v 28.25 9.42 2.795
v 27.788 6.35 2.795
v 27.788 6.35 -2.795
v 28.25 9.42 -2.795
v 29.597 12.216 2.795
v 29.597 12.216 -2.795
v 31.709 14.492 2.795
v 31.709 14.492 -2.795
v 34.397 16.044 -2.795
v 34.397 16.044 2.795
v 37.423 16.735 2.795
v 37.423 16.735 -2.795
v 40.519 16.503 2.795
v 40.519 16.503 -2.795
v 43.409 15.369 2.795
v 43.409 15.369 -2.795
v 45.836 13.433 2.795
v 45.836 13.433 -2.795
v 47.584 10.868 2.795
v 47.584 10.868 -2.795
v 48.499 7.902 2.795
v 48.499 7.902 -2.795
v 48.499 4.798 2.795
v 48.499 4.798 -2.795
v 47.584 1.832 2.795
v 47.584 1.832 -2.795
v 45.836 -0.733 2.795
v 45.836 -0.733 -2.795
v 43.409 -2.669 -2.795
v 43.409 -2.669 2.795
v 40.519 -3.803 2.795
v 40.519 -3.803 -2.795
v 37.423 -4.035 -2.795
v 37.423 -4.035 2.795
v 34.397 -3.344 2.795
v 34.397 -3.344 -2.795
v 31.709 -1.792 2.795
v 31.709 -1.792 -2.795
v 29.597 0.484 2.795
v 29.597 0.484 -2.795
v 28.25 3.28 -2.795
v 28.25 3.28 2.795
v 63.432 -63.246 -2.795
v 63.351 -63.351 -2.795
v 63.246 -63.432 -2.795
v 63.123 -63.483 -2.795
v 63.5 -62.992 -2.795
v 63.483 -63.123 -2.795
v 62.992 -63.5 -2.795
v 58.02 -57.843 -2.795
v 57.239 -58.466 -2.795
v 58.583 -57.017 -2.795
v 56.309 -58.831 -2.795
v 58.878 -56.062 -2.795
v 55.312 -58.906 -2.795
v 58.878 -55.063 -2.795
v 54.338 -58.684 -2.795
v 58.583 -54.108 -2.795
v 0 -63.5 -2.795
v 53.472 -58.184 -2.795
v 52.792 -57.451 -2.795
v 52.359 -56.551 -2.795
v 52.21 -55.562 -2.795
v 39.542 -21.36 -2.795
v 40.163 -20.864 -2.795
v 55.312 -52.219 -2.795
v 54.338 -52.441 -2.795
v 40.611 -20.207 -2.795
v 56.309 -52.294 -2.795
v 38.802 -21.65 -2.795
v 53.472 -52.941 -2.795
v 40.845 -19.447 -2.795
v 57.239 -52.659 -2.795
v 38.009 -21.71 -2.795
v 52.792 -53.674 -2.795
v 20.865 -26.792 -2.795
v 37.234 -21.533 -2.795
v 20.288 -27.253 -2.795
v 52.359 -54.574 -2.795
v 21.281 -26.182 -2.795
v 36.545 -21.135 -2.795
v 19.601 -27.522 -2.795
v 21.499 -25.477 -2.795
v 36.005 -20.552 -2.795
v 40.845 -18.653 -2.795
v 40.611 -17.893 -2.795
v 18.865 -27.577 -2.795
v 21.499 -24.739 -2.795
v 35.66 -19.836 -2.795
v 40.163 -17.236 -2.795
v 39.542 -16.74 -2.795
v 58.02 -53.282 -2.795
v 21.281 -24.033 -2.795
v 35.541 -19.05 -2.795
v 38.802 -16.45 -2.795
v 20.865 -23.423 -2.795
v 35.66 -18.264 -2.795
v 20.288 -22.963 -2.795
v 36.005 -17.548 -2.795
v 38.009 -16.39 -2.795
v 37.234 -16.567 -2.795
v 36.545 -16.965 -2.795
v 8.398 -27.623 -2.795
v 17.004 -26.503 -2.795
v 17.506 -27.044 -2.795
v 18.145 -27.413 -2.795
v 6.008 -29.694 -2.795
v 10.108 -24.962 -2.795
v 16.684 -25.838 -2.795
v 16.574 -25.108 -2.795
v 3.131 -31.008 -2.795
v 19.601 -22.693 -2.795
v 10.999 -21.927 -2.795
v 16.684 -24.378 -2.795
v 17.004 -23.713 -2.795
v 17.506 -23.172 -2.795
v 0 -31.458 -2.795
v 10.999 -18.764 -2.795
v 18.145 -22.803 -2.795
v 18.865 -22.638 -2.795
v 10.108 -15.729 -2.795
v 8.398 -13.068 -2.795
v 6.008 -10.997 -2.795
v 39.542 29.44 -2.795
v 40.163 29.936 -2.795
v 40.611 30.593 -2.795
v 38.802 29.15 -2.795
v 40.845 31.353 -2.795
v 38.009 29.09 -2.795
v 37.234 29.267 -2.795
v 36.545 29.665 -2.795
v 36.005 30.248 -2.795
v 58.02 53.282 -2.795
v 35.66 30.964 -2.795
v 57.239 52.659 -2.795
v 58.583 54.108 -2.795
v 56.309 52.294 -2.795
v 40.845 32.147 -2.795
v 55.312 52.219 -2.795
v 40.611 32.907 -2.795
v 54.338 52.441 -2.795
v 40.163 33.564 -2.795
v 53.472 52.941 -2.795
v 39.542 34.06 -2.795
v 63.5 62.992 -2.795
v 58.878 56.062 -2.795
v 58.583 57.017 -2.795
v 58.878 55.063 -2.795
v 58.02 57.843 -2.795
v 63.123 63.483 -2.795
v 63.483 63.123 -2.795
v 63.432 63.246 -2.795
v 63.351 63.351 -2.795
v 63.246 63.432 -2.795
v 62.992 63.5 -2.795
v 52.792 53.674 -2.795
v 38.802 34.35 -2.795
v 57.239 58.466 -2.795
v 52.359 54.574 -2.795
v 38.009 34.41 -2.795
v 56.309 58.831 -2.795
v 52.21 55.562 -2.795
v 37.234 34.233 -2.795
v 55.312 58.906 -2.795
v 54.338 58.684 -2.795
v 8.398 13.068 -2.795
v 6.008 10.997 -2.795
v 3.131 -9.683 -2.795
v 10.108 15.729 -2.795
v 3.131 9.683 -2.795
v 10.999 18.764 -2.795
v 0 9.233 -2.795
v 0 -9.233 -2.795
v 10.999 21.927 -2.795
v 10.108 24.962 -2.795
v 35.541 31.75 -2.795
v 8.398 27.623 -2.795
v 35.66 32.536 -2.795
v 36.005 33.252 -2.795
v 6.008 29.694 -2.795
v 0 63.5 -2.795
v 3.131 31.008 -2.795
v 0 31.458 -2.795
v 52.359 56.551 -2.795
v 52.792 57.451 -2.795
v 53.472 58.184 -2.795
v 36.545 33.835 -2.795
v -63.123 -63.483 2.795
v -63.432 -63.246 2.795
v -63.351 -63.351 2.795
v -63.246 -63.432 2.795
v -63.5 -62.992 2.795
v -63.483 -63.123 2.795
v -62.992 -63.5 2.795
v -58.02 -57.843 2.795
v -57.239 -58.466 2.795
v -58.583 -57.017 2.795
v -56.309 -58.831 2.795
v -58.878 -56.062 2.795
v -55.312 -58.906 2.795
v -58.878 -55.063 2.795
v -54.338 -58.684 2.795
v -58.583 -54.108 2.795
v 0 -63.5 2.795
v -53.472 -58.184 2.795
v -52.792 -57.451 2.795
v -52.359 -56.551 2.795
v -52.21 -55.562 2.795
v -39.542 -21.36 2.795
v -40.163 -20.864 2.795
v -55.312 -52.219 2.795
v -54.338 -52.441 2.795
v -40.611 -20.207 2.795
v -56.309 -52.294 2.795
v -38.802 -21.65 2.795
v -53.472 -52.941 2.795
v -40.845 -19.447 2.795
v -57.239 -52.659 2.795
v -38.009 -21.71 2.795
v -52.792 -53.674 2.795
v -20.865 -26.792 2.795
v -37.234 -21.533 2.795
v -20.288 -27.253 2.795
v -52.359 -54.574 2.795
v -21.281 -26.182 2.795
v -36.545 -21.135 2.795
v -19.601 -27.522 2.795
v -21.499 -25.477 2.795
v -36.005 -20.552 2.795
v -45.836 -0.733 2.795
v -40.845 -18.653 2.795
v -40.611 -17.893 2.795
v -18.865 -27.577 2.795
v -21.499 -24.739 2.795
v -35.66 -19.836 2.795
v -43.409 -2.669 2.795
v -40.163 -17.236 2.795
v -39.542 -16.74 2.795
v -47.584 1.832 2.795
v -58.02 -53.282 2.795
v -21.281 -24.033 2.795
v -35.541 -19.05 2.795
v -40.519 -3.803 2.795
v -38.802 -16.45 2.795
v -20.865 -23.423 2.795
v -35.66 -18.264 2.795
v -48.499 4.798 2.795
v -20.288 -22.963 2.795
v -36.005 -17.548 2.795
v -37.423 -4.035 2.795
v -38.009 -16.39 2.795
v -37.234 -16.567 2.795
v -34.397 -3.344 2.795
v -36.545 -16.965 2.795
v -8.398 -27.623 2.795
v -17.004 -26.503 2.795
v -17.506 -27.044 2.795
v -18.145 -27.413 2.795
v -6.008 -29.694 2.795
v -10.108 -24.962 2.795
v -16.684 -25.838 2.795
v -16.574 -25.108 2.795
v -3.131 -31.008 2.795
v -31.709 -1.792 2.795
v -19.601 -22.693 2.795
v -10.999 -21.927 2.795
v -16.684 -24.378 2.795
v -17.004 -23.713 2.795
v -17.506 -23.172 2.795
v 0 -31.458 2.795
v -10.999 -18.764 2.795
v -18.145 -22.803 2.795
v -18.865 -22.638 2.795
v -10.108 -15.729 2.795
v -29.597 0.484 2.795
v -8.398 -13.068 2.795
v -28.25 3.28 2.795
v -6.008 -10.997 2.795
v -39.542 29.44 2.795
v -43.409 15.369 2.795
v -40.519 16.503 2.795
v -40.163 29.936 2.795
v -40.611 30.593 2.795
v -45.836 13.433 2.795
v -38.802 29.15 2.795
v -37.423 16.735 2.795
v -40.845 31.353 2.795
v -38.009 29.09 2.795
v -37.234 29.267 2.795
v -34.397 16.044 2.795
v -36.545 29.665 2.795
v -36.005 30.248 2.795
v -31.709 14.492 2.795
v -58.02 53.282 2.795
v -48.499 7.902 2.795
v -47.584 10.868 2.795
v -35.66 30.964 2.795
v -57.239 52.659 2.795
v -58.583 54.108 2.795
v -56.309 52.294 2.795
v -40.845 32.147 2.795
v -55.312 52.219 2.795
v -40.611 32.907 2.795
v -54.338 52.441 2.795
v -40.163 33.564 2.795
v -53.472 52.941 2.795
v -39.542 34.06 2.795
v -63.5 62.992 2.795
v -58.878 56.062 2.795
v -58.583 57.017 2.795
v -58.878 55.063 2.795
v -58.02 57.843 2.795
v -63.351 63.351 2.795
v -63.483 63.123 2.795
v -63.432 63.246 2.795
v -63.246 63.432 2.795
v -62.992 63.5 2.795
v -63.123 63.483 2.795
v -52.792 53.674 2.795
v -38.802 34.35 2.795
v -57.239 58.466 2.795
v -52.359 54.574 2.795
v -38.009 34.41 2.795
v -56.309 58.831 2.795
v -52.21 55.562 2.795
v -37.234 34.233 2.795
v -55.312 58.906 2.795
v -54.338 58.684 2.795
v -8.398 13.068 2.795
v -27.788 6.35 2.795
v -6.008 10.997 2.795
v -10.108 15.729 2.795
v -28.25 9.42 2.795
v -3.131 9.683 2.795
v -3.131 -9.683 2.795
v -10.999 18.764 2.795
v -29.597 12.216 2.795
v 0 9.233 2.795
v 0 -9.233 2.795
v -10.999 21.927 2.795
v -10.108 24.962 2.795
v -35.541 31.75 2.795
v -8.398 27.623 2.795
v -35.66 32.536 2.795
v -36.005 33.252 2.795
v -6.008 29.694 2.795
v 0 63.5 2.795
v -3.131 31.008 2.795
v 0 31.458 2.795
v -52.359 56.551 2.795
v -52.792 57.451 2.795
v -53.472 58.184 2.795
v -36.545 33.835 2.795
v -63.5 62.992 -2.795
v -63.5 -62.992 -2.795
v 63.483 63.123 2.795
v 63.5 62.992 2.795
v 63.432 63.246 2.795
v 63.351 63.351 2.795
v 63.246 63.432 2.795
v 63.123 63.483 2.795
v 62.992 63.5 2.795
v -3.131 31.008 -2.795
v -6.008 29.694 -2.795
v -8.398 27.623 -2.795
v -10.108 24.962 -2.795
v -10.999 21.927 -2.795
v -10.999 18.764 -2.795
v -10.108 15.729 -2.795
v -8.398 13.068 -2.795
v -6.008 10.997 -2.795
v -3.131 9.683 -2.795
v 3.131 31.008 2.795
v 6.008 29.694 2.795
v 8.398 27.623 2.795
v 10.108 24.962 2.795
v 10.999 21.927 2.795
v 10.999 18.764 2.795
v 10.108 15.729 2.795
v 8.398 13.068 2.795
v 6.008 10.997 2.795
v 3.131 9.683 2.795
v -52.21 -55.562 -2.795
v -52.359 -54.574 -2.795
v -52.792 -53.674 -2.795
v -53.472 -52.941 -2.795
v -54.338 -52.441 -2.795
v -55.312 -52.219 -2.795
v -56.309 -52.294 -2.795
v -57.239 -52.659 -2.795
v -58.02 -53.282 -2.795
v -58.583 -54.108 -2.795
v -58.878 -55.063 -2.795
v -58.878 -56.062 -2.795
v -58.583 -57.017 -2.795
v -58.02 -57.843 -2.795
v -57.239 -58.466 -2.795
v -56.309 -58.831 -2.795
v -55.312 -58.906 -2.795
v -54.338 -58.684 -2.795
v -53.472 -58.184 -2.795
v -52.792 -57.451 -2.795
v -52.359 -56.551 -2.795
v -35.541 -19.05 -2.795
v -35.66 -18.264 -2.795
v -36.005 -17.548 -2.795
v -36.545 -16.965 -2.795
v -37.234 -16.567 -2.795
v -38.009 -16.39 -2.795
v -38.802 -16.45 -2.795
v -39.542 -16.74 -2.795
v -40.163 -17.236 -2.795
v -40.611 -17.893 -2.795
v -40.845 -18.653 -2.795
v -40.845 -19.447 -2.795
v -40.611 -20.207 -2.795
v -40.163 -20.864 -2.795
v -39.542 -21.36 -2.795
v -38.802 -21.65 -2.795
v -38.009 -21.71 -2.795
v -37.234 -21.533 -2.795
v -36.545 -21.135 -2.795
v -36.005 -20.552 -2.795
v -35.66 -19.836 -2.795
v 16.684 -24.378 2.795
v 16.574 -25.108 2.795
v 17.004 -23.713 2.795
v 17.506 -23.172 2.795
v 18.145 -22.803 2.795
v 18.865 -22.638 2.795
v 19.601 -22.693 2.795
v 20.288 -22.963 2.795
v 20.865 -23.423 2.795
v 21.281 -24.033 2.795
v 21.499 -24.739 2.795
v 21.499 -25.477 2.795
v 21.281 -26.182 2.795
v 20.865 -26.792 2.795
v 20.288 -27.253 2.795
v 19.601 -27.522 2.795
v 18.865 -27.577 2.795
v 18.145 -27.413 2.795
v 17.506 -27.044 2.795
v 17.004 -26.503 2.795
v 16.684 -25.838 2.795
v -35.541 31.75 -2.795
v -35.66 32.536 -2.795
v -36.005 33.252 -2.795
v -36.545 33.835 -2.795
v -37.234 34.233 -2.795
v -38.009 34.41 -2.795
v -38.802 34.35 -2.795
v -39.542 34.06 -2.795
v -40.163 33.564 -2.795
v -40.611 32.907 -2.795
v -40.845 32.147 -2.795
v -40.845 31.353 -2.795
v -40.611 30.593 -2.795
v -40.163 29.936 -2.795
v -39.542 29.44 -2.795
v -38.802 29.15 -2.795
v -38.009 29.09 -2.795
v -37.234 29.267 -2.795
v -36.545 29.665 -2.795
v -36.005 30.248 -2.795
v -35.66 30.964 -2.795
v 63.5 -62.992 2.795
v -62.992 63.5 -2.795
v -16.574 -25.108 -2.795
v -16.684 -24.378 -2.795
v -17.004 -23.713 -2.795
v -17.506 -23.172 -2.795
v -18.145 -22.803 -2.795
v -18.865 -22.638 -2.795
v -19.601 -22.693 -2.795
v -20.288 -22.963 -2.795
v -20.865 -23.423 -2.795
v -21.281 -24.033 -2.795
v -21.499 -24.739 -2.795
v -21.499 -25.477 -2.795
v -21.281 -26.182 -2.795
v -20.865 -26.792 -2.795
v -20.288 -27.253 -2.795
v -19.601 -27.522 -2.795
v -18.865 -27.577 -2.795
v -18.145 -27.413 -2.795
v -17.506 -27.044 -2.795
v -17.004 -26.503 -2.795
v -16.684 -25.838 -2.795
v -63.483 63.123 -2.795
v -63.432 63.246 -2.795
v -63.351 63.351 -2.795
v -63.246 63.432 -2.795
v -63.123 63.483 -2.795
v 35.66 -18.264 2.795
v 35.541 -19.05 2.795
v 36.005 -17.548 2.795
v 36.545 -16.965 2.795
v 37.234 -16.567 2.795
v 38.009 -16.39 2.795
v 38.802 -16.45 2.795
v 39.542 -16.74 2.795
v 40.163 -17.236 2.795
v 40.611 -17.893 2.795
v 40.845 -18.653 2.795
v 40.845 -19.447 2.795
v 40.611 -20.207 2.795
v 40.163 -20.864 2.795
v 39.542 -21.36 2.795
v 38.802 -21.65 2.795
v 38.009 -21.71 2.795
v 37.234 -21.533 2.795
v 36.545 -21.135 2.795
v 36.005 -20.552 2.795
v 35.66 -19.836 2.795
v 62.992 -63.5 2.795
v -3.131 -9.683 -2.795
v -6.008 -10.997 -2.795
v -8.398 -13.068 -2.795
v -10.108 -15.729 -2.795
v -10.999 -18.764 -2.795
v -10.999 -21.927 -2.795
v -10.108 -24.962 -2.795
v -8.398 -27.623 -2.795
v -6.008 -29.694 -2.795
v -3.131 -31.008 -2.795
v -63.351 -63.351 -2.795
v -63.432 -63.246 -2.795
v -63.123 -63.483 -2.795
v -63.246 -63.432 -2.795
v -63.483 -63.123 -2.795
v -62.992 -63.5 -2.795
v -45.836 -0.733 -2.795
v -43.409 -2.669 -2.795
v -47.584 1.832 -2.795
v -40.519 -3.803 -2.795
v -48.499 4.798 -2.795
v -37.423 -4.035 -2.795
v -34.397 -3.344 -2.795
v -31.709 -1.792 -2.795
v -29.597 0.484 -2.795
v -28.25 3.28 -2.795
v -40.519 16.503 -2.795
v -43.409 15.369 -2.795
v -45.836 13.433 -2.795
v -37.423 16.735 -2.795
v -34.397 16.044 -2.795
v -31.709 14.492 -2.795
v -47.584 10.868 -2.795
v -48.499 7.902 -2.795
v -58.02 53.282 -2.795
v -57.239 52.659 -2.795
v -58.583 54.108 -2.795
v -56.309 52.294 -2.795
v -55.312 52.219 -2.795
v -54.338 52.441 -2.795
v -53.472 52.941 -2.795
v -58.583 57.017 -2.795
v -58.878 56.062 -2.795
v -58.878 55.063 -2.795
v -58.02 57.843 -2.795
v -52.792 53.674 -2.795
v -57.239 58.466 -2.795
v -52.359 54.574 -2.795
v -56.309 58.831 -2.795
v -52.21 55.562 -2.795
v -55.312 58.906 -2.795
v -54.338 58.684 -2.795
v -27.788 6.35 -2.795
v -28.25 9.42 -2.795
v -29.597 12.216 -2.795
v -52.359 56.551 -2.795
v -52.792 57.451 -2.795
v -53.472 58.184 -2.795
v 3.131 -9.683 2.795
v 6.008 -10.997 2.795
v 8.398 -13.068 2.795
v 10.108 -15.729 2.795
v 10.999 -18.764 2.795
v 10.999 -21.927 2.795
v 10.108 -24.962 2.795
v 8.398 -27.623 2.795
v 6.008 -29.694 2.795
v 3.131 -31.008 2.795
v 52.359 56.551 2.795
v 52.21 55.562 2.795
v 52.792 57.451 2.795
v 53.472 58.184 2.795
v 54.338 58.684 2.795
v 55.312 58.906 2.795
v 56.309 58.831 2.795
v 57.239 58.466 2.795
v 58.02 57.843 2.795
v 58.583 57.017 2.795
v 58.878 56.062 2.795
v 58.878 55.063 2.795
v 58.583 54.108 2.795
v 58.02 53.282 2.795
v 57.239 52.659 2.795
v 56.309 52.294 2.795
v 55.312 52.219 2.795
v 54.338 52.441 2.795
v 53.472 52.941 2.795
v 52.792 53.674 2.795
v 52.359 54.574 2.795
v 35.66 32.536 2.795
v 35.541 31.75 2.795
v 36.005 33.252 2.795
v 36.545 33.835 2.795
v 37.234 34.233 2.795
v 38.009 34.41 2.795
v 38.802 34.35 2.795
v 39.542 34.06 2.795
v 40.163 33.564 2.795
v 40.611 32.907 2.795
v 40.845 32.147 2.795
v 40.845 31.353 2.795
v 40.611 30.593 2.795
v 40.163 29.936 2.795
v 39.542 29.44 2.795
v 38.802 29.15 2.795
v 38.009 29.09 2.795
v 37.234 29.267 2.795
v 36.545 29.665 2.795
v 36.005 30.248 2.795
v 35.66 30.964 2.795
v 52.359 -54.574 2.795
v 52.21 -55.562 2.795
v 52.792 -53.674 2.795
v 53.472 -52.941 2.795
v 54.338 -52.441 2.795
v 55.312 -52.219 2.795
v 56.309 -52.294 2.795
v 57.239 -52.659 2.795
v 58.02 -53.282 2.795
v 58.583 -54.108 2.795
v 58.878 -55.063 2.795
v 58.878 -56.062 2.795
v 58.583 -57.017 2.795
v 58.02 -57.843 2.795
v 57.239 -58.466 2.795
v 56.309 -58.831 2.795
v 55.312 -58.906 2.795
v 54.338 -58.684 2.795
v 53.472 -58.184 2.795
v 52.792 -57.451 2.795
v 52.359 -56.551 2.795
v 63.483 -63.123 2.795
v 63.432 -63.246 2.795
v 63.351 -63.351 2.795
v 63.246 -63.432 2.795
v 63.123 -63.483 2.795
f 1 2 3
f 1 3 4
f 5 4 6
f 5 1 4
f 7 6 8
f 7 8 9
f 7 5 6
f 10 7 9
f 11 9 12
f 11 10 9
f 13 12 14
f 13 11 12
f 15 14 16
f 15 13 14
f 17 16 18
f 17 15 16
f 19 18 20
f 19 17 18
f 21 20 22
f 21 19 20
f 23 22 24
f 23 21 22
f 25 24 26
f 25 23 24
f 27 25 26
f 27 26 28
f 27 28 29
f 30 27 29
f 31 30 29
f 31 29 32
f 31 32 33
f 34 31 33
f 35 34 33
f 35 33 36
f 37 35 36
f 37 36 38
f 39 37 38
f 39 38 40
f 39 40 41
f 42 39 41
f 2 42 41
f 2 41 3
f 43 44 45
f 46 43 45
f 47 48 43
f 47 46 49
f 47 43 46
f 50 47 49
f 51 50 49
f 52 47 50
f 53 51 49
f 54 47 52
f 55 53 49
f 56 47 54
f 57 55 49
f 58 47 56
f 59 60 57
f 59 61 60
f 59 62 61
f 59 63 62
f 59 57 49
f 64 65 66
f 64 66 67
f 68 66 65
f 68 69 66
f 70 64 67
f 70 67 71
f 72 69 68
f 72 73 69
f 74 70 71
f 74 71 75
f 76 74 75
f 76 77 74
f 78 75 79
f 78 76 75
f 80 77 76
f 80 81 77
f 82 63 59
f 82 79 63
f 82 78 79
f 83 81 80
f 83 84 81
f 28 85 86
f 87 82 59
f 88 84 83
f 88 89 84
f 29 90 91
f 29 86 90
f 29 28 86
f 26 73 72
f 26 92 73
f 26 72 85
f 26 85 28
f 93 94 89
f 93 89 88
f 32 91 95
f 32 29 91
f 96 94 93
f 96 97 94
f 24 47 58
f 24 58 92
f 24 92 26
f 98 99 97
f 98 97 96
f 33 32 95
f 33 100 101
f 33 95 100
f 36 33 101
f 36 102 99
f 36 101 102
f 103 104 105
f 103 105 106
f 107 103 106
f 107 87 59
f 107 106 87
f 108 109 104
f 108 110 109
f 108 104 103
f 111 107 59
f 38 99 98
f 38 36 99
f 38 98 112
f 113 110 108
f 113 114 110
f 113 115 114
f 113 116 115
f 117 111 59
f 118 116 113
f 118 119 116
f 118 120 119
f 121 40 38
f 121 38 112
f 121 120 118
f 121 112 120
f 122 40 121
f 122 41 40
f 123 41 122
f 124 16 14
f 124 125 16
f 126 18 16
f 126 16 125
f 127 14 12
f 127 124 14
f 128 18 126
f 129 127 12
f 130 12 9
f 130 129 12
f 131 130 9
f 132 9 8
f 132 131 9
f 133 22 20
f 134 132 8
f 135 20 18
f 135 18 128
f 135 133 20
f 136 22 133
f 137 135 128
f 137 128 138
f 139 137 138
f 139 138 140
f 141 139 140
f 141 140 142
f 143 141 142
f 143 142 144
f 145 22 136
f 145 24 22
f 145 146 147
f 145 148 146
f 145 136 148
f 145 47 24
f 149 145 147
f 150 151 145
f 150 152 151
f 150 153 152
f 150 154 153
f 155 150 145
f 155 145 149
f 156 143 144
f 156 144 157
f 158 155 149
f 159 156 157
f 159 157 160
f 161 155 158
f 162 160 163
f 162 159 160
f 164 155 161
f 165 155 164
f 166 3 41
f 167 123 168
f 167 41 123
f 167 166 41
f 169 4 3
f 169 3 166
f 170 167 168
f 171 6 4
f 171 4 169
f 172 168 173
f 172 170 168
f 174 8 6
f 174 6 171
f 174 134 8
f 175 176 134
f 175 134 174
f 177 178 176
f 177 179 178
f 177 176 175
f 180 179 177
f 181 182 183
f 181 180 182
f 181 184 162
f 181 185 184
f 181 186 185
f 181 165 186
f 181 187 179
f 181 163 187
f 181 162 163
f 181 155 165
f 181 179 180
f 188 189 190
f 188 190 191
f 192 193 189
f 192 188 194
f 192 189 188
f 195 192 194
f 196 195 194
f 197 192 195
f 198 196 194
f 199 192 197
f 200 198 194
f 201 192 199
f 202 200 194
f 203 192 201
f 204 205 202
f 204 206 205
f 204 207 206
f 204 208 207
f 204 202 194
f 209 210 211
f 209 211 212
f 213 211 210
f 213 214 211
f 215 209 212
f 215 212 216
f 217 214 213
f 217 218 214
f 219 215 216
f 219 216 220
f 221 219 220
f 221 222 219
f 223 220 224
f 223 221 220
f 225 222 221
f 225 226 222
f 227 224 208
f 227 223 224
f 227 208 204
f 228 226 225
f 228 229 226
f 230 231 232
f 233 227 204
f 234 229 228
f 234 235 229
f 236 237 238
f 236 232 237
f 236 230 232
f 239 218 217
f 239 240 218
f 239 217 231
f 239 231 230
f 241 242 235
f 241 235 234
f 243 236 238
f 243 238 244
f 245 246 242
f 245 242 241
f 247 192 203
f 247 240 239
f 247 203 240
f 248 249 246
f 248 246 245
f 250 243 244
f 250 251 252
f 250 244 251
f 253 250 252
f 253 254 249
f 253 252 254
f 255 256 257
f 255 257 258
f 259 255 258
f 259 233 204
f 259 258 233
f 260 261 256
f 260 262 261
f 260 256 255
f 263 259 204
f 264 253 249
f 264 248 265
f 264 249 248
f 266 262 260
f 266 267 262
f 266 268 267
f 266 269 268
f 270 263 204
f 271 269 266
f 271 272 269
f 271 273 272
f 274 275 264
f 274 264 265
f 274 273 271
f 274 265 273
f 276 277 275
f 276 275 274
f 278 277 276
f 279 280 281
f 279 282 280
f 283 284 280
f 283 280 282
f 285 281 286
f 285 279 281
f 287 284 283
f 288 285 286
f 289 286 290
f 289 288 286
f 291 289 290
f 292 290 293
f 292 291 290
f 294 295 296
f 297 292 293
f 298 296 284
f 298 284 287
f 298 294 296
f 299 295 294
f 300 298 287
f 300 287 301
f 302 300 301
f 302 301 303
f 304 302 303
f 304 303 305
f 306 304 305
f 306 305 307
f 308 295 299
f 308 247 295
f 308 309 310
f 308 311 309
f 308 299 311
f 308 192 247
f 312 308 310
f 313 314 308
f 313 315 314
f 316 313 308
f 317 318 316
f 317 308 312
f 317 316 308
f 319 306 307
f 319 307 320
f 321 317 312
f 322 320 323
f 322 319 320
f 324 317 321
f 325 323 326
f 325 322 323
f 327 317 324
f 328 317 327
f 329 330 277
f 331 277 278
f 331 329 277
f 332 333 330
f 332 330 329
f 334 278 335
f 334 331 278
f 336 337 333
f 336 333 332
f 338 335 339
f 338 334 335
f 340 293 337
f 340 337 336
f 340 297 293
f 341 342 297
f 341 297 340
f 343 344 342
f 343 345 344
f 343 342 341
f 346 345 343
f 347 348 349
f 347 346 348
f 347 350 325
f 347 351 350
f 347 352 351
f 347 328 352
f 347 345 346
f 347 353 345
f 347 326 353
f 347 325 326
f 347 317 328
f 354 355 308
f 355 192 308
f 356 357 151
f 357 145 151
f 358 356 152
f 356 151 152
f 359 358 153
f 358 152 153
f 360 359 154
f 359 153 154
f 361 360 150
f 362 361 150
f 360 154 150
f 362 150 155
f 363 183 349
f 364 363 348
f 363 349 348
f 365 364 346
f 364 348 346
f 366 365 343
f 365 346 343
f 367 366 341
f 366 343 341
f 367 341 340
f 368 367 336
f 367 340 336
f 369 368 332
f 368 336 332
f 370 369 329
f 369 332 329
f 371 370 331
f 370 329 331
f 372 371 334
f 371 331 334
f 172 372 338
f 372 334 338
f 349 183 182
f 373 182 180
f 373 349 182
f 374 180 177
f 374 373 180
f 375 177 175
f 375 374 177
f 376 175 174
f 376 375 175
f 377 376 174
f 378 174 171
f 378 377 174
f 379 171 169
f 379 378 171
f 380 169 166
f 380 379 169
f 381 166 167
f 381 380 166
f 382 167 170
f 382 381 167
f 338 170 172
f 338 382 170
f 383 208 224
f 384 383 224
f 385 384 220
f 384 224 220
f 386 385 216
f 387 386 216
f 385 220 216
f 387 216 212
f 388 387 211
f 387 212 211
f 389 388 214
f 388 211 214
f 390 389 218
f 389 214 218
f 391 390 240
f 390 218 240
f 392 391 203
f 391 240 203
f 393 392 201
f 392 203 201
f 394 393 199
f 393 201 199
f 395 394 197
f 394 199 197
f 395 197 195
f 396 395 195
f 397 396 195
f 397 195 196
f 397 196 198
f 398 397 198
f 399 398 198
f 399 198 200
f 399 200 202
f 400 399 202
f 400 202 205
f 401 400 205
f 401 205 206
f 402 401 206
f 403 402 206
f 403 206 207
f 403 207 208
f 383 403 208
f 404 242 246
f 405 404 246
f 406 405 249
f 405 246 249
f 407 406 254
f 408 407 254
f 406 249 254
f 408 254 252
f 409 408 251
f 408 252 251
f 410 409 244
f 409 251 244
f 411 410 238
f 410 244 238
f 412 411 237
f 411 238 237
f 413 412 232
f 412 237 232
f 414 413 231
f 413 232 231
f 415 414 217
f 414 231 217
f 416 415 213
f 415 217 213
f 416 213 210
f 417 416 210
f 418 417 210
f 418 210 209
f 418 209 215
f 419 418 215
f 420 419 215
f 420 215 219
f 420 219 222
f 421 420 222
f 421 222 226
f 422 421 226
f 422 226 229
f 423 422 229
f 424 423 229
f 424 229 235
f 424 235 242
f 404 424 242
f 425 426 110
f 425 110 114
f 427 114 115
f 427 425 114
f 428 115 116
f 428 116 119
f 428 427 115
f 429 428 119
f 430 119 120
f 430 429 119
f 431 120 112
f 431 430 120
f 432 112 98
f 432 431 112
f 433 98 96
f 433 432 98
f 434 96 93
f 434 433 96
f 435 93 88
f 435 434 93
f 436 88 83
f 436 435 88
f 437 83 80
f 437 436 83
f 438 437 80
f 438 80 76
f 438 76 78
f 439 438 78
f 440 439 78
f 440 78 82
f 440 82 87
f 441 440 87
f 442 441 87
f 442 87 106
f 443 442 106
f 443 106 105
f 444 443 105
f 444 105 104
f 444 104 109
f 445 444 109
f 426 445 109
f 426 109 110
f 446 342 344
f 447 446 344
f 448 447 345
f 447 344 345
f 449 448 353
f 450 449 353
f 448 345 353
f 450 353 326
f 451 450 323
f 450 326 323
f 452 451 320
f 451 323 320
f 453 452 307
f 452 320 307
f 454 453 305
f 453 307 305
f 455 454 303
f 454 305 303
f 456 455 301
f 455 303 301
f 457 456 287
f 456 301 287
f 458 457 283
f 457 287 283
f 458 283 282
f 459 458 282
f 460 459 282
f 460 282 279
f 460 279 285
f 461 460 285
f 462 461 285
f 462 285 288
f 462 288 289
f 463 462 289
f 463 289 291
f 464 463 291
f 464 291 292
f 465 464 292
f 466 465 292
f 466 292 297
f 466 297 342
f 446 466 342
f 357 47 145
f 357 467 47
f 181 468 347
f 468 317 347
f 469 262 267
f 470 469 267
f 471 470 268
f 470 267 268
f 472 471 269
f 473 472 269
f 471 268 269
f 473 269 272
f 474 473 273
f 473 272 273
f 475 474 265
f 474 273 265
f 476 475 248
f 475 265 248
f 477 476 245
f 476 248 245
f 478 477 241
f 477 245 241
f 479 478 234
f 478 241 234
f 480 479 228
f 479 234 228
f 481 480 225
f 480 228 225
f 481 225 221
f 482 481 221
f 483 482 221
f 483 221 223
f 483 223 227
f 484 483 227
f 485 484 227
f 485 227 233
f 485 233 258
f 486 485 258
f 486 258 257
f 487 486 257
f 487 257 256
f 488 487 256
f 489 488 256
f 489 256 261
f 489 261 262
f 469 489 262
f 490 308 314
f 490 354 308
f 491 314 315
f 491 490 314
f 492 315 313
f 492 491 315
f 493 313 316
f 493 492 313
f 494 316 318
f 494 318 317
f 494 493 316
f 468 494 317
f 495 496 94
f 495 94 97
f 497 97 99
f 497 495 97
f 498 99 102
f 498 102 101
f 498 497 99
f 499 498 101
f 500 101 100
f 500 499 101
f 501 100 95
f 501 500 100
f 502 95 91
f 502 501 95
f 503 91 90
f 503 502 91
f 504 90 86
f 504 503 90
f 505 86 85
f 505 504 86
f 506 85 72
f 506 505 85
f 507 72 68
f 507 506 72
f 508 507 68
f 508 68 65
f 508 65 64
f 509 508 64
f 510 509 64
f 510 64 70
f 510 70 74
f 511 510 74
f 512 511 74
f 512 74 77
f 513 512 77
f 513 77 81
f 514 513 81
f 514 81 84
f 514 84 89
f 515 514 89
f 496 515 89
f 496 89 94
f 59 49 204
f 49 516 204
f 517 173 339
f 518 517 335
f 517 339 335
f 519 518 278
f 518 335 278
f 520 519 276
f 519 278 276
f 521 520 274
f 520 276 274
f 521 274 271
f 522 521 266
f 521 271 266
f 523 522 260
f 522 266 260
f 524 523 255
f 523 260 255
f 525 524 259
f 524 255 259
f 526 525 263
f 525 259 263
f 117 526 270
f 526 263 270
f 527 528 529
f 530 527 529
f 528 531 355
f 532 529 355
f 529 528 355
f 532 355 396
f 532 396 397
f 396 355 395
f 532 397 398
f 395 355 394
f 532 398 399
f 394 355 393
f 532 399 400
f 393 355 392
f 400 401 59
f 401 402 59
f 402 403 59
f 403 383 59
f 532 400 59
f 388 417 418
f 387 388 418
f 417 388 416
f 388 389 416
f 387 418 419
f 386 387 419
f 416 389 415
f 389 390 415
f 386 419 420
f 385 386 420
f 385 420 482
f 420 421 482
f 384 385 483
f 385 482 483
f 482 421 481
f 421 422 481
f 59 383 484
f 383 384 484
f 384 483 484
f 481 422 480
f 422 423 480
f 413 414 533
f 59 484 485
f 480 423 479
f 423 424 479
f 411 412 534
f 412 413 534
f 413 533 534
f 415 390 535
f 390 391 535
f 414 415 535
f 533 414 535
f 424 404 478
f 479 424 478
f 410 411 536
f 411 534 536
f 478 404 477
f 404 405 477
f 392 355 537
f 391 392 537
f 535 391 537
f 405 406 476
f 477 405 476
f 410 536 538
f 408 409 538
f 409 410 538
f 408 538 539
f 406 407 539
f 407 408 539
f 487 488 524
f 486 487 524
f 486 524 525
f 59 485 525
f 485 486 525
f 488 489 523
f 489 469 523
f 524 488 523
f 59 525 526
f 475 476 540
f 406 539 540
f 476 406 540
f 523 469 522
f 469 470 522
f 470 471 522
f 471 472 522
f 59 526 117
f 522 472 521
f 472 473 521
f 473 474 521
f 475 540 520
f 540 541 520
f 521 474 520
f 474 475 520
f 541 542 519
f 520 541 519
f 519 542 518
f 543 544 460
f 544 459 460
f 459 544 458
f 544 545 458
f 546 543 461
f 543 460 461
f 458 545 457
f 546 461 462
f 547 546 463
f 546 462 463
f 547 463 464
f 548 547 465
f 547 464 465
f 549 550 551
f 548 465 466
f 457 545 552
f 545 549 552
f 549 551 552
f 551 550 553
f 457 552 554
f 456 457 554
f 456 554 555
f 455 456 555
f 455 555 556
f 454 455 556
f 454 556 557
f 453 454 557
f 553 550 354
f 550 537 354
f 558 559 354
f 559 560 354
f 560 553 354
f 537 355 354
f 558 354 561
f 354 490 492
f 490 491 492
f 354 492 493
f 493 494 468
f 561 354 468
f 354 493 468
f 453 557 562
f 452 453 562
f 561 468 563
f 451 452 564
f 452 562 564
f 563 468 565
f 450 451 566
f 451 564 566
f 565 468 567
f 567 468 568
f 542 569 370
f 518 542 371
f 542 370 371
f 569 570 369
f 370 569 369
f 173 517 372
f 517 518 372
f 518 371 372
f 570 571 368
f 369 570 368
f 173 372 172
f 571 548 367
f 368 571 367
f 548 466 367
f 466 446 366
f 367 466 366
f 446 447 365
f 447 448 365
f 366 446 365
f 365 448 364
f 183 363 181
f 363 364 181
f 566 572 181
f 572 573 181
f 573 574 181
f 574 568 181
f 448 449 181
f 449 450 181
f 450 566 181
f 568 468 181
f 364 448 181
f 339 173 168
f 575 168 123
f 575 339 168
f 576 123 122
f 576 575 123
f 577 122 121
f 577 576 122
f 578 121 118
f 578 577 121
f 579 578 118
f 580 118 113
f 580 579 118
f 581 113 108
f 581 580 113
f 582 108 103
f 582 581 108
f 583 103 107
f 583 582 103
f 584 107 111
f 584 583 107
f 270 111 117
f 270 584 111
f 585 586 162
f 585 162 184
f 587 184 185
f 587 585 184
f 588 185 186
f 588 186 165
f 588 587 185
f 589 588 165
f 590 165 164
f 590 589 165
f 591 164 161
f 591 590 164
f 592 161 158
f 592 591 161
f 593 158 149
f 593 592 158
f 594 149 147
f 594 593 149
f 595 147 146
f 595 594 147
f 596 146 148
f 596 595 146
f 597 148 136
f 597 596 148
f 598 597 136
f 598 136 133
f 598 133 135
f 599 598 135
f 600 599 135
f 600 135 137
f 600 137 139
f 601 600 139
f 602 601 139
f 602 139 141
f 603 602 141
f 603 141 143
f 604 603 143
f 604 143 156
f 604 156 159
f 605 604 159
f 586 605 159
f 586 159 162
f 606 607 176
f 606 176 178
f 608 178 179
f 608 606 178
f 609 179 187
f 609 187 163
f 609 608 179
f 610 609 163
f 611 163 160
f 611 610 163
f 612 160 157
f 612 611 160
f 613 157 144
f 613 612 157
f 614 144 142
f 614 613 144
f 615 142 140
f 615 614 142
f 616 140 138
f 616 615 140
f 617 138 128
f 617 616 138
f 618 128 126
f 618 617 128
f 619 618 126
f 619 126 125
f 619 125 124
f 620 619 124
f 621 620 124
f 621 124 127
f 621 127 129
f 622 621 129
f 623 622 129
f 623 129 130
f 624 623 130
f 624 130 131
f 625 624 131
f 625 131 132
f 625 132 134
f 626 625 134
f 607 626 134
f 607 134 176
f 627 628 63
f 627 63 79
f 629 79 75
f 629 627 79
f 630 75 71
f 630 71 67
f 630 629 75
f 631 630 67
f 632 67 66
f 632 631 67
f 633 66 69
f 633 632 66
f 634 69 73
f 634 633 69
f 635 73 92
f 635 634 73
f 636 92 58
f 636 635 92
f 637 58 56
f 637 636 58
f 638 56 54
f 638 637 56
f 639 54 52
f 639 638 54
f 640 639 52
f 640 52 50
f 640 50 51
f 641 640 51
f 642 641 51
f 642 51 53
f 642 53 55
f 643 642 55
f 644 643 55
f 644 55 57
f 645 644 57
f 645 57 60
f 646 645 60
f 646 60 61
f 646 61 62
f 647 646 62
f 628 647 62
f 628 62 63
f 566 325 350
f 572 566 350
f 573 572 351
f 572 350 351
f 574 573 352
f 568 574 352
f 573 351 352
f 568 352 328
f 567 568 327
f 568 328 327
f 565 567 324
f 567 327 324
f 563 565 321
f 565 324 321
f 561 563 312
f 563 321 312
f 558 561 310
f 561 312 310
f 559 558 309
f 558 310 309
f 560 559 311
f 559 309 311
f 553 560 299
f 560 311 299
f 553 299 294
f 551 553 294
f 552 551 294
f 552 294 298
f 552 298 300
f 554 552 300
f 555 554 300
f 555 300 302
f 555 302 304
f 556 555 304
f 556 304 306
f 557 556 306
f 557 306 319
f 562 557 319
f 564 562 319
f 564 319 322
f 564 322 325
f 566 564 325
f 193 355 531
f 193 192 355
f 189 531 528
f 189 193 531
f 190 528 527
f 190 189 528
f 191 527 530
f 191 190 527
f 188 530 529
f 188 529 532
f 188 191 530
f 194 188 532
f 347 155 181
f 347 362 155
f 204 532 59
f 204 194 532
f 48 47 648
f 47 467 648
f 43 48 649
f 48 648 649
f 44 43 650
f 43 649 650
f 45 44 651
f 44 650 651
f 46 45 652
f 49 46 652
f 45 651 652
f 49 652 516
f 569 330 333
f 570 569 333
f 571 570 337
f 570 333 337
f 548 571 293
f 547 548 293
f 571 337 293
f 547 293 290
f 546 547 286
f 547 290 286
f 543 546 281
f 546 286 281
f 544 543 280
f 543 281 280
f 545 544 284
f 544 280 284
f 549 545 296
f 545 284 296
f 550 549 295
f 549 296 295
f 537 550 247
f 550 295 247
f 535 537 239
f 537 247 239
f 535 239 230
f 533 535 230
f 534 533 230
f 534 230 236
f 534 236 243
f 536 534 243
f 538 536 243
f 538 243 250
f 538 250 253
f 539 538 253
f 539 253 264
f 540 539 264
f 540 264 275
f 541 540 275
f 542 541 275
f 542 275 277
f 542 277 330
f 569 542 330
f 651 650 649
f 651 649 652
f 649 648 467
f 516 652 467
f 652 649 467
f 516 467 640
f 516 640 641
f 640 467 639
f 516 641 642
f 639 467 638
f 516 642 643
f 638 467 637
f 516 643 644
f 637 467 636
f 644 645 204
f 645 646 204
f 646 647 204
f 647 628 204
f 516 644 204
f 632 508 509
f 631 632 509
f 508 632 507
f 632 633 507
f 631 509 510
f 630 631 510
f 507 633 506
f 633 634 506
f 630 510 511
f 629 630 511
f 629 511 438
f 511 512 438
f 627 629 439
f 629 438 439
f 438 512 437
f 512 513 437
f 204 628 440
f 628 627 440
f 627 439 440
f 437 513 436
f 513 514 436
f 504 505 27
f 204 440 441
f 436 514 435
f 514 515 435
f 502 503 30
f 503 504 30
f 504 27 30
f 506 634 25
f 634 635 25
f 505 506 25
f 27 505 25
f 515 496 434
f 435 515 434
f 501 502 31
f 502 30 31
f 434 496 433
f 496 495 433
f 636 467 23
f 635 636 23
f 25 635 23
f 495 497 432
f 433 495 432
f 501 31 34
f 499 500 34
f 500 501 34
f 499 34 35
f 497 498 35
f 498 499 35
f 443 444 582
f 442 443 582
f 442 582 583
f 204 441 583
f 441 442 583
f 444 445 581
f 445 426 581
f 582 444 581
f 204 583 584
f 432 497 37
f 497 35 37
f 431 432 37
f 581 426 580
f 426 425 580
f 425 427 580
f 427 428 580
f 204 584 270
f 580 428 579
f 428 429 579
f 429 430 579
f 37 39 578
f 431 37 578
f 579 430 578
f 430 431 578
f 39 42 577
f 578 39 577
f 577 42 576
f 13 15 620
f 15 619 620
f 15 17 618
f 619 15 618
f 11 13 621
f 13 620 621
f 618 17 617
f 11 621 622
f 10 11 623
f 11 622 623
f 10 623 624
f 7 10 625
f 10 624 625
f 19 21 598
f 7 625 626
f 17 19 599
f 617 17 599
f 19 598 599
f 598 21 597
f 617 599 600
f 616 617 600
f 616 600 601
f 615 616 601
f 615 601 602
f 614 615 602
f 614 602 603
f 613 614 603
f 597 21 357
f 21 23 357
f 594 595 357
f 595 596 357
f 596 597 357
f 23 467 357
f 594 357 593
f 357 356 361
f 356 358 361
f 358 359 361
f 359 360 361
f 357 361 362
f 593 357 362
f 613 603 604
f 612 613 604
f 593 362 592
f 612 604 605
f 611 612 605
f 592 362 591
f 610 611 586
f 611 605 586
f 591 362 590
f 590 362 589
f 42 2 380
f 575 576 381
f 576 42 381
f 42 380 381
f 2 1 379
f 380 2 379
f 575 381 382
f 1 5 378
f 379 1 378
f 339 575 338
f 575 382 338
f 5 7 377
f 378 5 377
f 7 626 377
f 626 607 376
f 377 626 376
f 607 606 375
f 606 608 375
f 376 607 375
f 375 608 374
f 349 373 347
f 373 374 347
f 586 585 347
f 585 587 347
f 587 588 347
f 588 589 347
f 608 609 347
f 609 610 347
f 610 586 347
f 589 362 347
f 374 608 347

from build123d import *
from build123d.topology import SkipClean

# Parameters (mm, degrees)
SKETCH1_W      = 63.5
SKETCH1_H      = 127
EXTRUDE1_DEPTH = 2.795
SKETCH2_R      = 3.3528
SKETCH2_R_2    = 10.414
SKETCH2_R_3    = 2.667
SKETCH2_R_4    = 2.4765
SKETCH2_R_5    = 11.1125
EXTRUDE2_DEPTH = 90.976375233
FILLET1_R      = 0.508


with BuildPart() as part:
    # Sketch1 → Extrude1 (new, symmetric)
    with BuildSketch(Plane.XY):
        with Locations((-31.75, 0)):
            Rectangle(SKETCH1_W, SKETCH1_H)
    extrude(amount=EXTRUDE1_DEPTH, both=True)

    # Sketch2 → Extrude2 (cut, through all)
    with BuildSketch(Plane.XY.offset(2.795)):
        with Locations((-55.5625, 55.5625)):
            Circle(SKETCH2_R)
        with Locations((-38.2016, 6.35)):
            Circle(SKETCH2_R_2)
        with Locations((-38.2082548, -19.05)):
            Circle(SKETCH2_R_3)
        with Locations((-19.05, -25.1079)):
            Circle(SKETCH2_R_4)
        with Locations((-38.2082548, 31.75)):
            Circle(SKETCH2_R_3)
        with Locations((0, -20.3454)):
            Circle(SKETCH2_R_5)
        with Locations((-55.5625, -55.5625)):
            Circle(SKETCH2_R)
        with Locations((0, 20.3454)):
            Circle(SKETCH2_R_5)
    extrude(amount=-EXTRUDE2_DEPTH, mode=Mode.SUBTRACT)

    # Fillet1
    fillet1_edges = [part.edges().sort_by_distance(p)[0] for p in [
        (-63.5, -63.5, 0),
        (-63.5, 63.5, 0),
    ]]
    fillet(fillet1_edges, radius=FILLET1_R)

    # Mirror1: part across plane


with BuildPart() as part_1:
    with SkipClean():  # the faces are left unmerged after this step: merging them gives an invalid solid
        add(part.part)
        add(part.part.mirror(Plane(origin=(0, -110.583968638, 2.795), x_dir=(0, 0, 1), z_dir=(1, 0, 0))))


solid = part_1.part
